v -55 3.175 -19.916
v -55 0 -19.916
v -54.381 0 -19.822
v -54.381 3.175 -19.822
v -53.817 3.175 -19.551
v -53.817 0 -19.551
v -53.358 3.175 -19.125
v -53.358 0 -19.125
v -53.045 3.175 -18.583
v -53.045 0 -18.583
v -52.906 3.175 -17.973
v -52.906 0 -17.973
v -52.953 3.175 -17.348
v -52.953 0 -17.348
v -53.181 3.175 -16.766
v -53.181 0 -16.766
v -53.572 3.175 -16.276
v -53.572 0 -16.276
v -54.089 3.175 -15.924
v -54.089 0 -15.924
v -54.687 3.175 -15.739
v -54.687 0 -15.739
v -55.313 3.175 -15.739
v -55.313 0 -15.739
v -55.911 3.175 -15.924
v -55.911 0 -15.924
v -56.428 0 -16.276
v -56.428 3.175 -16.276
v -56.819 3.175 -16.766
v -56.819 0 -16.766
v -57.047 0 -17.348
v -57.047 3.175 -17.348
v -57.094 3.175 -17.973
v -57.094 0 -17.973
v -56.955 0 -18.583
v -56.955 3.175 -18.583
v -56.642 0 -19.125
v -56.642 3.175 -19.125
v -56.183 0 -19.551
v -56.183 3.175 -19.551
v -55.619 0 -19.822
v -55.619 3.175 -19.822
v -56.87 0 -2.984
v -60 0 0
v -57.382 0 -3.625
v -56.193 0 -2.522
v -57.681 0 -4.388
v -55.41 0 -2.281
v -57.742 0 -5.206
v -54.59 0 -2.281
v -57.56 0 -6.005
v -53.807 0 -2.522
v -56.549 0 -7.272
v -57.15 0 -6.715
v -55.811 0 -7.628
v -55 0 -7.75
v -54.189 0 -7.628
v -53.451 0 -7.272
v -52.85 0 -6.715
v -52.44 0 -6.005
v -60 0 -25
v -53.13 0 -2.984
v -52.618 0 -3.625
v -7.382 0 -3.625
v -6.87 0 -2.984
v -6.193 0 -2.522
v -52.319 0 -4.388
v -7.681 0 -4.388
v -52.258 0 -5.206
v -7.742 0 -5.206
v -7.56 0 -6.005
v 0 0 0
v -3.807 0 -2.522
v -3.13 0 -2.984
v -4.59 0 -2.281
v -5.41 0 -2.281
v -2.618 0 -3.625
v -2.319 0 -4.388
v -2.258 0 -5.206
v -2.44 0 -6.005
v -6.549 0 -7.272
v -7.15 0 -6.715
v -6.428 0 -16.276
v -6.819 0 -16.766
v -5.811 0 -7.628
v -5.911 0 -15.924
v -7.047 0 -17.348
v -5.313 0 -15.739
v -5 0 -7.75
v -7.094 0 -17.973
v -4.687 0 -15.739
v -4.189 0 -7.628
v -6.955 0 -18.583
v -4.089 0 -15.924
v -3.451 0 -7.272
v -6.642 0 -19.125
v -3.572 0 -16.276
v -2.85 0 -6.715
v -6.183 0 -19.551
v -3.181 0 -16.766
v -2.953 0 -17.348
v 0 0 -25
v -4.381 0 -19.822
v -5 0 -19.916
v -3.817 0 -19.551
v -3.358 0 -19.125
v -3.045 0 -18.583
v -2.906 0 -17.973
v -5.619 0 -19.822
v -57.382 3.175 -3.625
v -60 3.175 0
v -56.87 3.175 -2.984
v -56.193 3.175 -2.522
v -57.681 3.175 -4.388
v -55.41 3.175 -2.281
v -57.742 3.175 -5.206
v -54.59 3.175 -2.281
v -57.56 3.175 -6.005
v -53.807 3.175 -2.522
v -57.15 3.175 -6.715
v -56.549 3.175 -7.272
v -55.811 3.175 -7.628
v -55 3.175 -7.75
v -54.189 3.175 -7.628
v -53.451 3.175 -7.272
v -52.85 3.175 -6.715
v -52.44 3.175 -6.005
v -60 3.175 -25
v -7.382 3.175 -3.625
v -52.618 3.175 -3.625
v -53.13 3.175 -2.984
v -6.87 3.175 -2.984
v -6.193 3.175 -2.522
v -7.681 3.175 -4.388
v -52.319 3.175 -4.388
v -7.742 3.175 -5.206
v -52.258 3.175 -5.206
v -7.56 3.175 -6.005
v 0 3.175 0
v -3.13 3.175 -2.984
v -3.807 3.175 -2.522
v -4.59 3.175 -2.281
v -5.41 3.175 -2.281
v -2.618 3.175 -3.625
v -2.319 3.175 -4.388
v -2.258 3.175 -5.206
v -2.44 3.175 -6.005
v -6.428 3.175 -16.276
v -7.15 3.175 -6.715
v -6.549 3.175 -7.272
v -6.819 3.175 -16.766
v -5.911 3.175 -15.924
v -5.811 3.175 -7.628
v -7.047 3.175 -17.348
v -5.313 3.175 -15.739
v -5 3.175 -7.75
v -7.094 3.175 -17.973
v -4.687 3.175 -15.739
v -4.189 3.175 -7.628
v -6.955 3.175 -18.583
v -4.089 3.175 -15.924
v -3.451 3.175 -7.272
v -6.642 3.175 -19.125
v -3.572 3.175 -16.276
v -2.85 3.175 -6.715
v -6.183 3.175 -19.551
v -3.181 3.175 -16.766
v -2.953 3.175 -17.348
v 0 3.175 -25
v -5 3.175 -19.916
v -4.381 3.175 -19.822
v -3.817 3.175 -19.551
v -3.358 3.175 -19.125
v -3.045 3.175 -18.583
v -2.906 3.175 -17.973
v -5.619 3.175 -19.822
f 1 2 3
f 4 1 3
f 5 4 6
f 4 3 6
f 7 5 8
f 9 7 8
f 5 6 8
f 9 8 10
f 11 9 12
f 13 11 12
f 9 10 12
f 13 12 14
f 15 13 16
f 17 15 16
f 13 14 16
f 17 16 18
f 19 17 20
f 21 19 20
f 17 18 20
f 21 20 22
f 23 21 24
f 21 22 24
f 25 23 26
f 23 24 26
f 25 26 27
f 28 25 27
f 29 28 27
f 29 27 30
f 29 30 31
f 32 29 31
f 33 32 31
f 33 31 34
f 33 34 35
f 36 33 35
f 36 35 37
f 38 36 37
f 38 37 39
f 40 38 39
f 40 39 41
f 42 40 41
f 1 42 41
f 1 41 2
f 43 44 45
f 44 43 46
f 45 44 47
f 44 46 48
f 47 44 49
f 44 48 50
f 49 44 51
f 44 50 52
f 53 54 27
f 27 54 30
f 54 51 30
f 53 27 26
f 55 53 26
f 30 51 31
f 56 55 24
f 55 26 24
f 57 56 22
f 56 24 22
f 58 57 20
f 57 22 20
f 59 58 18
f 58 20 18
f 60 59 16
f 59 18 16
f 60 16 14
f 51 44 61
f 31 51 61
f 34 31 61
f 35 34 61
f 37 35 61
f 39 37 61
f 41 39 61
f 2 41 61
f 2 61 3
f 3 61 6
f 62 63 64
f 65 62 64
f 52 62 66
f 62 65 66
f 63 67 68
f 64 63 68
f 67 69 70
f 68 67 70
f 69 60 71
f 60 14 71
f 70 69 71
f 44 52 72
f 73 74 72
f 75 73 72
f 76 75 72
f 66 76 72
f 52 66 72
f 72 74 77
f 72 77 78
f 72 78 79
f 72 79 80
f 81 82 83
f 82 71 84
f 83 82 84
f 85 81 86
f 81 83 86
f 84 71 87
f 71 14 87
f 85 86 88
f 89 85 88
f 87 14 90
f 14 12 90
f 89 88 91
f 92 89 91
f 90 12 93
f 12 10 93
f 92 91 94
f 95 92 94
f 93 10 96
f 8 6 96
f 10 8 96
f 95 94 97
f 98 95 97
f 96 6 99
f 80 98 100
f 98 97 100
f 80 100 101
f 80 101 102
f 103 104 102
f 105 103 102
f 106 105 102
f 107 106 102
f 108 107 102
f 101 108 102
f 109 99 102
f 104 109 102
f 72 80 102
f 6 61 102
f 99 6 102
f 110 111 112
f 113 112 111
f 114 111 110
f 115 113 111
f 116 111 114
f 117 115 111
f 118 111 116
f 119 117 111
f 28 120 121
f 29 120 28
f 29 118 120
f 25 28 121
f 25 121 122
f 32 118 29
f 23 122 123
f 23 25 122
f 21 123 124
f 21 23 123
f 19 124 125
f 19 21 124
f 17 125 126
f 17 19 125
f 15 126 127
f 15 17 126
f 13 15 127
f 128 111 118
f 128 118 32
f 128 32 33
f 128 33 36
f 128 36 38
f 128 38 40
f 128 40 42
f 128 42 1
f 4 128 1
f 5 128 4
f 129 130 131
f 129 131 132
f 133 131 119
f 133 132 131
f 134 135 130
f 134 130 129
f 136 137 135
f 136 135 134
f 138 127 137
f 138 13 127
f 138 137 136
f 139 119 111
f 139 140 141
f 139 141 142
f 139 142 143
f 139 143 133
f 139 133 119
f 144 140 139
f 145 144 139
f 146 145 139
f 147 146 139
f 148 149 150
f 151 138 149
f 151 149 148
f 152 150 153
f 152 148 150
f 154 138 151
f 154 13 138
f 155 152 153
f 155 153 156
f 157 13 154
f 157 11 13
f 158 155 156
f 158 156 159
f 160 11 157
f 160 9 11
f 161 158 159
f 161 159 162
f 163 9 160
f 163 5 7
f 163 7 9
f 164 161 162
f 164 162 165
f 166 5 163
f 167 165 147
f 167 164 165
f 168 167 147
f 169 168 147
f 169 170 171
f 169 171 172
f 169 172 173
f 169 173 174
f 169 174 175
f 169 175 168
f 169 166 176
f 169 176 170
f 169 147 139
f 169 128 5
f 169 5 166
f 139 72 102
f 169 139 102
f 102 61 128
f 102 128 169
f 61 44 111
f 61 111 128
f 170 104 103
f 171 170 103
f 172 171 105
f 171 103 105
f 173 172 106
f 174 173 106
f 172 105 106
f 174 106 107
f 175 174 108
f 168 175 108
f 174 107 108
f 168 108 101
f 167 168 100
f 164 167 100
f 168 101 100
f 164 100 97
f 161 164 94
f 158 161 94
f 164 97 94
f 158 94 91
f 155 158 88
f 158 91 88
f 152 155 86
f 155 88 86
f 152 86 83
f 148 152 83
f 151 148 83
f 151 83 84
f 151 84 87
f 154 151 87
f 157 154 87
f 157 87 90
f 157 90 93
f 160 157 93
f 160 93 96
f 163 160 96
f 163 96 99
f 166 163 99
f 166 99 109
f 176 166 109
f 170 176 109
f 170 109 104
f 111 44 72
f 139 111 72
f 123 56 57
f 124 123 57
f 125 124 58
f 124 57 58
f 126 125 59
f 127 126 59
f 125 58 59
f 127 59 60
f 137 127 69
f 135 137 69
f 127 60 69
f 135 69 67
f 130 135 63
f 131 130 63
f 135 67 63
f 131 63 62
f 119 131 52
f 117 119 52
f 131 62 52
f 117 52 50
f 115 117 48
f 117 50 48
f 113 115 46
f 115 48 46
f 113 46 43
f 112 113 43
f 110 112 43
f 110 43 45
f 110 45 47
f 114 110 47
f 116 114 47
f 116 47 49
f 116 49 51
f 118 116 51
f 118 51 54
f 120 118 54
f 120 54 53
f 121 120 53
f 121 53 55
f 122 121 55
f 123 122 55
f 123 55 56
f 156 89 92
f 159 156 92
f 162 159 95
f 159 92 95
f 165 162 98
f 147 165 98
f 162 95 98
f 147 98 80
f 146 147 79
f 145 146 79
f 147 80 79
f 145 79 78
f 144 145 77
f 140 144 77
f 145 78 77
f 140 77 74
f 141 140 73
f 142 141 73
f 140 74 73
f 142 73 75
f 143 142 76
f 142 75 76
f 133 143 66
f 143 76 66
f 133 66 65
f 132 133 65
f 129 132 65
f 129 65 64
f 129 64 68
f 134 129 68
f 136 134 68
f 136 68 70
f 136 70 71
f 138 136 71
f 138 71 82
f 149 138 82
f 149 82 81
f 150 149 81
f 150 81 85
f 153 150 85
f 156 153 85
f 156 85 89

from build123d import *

# Parameters (mm, degrees)
SKETCH1_W                 = 60
SKETCH1_H                 = 25
BOSS_EXTRUDE1_DEPTH       = 3.175
M5_CLEARANCE_HOLE2_D      = 5.5
M5_CLEARANCE_HOLE2_DEPTH  = 15
M5_CLEARANCE_HOLE2_TIP    = 1.652366702
M5X0_8_TAPPED_HOLE2_D     = 4.2
M5X0_8_TAPPED_HOLE2_DEPTH = 15
M5X0_8_TAPPED_HOLE2_TIP   = 1.2618073


with BuildPart() as part:
    # Sketch1 → Boss-Extrude1 (new body)
    with BuildSketch(Plane(origin=(0, 0, 0), x_dir=(1, 0, 0), z_dir=(0, 1, 0))):
        with Locations((-30, 12.5)):
            Rectangle(SKETCH1_W, SKETCH1_H)
    extrude(amount=BOSS_EXTRUDE1_DEPTH)

    # M5 Clearance Hole2
    with Locations(Plane(origin=(-55, 3.175, -5), x_dir=(0, 0, 1), z_dir=(0, 1, 0))):
        with Locations((0, 0), (0, 50)):
            Hole(M5_CLEARANCE_HOLE2_D / 2, depth=M5_CLEARANCE_HOLE2_DEPTH)
            with Locations((0, 0, -(M5_CLEARANCE_HOLE2_DEPTH + M5_CLEARANCE_HOLE2_TIP / 2))):  # 118° drill point
                Cone(0, M5_CLEARANCE_HOLE2_D / 2, M5_CLEARANCE_HOLE2_TIP, mode=Mode.SUBTRACT)

    # M5x0.8 Tapped Hole2
    with Locations(Plane(origin=(-55, 3.175, -17.8156), x_dir=(0, 0, 1), z_dir=(0, 1, 0))):
        with Locations((0, 0), (0, 50)):
            Hole(M5X0_8_TAPPED_HOLE2_D / 2, depth=M5X0_8_TAPPED_HOLE2_DEPTH)
            with Locations((0, 0, -(M5X0_8_TAPPED_HOLE2_DEPTH + M5X0_8_TAPPED_HOLE2_TIP / 2))):  # 118° drill point
                Cone(0, M5X0_8_TAPPED_HOLE2_D / 2, M5X0_8_TAPPED_HOLE2_TIP, mode=Mode.SUBTRACT)


solid = part.part
